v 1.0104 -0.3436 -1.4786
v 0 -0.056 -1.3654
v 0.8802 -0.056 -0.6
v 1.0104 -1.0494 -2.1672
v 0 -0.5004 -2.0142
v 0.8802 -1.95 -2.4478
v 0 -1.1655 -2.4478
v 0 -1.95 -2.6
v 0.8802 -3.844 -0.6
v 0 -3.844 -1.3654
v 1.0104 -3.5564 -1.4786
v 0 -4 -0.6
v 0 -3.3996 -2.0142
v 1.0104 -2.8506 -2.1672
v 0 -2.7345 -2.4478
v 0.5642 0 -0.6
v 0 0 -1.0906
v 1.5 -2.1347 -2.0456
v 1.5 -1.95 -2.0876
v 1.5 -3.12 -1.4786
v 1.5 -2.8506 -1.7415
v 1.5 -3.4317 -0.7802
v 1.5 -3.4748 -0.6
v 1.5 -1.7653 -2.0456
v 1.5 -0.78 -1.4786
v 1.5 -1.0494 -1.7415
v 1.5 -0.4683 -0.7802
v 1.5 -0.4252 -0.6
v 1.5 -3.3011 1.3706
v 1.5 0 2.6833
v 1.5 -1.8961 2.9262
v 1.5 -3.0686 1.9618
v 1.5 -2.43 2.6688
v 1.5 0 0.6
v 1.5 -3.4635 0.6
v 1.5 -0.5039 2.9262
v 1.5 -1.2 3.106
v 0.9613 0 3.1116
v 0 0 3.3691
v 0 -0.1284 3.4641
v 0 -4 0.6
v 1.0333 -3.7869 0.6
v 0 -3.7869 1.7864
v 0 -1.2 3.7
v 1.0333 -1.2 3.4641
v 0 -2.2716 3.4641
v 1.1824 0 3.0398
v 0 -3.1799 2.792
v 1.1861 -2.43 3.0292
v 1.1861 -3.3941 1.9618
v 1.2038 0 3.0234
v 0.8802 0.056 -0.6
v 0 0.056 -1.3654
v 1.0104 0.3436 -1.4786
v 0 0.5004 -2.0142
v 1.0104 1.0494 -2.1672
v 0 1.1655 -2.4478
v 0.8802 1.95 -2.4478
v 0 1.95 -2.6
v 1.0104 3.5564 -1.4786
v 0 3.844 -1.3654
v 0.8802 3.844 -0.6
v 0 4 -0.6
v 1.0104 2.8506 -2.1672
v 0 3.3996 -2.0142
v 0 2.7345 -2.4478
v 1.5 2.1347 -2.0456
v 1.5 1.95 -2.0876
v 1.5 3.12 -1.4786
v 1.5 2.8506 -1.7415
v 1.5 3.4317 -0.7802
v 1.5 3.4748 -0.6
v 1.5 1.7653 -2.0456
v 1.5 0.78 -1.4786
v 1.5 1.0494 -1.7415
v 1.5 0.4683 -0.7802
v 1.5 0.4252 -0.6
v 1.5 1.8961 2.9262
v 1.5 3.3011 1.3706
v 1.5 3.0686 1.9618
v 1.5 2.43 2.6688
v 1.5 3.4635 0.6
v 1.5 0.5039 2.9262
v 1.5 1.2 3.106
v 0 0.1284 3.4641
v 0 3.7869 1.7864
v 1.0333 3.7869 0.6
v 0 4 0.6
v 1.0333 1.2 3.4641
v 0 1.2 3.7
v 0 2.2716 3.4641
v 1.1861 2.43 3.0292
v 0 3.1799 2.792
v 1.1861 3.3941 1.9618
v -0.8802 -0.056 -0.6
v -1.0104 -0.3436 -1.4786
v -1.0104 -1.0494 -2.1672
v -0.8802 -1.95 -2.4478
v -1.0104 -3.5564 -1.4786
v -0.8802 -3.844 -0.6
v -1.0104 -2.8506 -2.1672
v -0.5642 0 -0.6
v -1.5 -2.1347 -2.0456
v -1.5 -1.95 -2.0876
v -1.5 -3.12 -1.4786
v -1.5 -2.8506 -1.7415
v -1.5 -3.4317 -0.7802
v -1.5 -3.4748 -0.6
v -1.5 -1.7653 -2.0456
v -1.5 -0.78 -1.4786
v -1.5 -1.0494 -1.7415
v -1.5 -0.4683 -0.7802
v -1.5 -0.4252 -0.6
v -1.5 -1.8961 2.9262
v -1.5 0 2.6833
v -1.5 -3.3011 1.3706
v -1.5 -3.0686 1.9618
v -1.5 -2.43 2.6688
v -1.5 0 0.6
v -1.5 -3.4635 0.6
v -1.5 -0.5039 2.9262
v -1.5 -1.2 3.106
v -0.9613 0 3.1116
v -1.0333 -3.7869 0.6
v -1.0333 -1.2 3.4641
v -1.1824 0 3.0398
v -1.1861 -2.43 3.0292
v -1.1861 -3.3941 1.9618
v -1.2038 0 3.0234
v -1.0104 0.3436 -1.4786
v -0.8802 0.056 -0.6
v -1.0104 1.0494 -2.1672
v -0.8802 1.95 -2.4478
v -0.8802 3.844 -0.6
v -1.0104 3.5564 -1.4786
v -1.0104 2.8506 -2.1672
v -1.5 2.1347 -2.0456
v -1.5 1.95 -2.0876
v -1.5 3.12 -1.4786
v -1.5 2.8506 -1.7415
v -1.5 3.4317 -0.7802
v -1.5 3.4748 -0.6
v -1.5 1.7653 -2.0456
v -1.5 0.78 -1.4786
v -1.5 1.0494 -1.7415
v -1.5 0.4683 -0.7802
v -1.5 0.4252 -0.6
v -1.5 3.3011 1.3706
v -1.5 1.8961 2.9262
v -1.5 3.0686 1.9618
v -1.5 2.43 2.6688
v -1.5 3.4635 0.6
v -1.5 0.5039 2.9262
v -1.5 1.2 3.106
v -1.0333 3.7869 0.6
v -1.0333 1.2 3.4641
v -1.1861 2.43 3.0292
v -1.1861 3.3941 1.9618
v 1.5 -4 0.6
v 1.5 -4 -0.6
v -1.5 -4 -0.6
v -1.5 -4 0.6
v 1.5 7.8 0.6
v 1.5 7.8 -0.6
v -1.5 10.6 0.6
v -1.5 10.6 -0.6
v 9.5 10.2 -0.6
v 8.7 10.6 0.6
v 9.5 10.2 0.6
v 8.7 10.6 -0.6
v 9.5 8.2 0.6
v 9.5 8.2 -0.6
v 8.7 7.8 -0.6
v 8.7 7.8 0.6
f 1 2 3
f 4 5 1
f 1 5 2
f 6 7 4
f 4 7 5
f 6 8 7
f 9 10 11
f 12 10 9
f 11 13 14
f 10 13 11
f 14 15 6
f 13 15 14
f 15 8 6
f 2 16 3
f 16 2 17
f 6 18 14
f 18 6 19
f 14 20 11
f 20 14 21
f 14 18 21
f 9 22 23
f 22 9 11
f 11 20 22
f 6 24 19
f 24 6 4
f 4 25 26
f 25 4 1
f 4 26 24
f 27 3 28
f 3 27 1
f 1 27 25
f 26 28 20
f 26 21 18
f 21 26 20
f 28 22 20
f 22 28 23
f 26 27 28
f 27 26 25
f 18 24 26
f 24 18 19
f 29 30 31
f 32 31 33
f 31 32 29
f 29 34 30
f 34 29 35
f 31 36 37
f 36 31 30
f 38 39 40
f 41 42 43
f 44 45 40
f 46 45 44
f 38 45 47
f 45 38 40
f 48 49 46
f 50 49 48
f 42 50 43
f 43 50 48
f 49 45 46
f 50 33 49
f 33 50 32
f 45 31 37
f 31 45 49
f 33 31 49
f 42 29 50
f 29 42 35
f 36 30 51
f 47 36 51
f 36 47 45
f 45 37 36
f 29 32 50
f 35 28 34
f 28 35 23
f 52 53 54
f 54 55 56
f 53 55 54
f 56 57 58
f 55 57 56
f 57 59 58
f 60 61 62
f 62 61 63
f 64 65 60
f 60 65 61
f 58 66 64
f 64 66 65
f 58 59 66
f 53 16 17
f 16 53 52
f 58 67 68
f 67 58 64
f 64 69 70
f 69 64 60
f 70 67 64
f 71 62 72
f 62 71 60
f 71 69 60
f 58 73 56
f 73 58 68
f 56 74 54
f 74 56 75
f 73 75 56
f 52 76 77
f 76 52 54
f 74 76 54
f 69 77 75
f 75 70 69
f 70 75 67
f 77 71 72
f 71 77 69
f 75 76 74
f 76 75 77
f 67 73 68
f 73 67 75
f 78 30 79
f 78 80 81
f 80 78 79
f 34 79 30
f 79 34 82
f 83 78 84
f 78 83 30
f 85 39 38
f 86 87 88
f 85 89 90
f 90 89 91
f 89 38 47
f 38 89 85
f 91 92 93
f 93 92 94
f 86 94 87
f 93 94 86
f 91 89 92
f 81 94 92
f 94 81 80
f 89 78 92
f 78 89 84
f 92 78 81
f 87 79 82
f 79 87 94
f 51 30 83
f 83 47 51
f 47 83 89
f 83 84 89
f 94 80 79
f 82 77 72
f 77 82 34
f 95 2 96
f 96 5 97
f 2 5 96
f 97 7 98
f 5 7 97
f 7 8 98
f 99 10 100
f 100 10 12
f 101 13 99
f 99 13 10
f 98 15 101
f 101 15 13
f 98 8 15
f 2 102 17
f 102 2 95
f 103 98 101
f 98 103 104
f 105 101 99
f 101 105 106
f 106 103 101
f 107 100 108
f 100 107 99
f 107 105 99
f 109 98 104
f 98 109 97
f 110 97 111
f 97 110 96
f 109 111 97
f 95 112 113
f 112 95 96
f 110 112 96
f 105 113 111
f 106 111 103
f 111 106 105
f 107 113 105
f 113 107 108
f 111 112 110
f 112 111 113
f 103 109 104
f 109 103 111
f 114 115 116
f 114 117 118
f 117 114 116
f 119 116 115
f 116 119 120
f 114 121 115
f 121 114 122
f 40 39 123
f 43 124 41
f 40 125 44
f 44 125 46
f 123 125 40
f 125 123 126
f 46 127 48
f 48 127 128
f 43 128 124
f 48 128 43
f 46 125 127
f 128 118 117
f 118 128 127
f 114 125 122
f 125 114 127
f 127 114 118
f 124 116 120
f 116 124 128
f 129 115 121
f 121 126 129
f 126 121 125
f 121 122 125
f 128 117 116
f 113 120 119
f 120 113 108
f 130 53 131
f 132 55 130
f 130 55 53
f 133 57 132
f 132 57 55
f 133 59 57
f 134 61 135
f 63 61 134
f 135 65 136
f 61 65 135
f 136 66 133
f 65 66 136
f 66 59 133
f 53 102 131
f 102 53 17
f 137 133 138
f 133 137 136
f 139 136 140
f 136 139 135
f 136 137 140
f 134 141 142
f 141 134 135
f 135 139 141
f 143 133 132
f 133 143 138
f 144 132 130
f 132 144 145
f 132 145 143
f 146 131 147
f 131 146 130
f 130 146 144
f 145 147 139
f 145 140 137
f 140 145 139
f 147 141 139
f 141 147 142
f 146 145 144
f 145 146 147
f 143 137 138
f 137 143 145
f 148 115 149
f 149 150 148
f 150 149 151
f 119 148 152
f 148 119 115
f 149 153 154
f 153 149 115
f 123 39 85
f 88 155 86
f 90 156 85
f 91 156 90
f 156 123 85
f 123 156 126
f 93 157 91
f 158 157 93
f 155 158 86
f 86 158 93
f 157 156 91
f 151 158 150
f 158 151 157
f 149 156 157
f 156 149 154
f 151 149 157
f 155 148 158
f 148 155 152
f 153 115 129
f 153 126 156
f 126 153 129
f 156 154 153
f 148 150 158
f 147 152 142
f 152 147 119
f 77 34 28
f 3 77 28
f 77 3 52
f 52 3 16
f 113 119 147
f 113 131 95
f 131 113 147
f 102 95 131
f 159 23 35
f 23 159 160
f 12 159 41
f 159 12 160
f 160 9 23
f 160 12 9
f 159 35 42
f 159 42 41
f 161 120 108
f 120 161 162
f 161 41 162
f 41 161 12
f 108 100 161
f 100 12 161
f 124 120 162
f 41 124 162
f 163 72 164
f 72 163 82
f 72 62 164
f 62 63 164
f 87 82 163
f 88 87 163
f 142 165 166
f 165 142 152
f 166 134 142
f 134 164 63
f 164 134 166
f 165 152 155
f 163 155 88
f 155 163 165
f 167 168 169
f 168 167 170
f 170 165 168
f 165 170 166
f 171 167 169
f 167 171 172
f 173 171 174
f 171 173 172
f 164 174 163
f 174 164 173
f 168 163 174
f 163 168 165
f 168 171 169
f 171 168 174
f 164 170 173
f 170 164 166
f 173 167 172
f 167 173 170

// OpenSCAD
use <../lib.scad>
use <../p/box2-5.scad>
use <../p/rect2p.scad>
use <../p/rect3.scad>
use <s/32024s01.scad>
$fa=1; $fs=0.2;
function ldraw_lib__32024(realsolid=false) = [
// 0 ~Electric Code Pilot Focusing Lens
// 0 Name: 32024.dat
// 0 Author: Max Martin Richter [MMR1988]
// 0 !LDRAW_ORG Part UPDATE 2015-02
// 0 !LICENSE Licensed under CC BY 2.0 and CC BY 4.0 : see CAreadme.txt
// 
// 0 BFC CERTIFY CCW
  [0,"BFC","CERTIFY"],
  [0,"BFC","CCW"],
// 
// 0 !HISTORY 2015-12-30 [PTadmin] Official Update 2015-02
// 
// 
// 1 16 0 0 0 1 0 0 0 1 0 0 0 1 s\32024s01.dat
  [1,16,0,0,0,1,0,0,0,1,0,0,0,1, ldraw_lib__s__32024s01(realsolid)],
// 1 16 0 0 0 1 0 0 0 1 0 0 0 -1 s\32024s01.dat
  [1,16,0,0,0,1,0,0,0,1,0,0,0,-1, ldraw_lib__s__32024s01(realsolid)],
// 1 16 0 0 0 -1 0 0 0 1 0 0 0 1 s\32024s01.dat
  [1,16,0,0,0,-1,0,0,0,1,0,0,0,1, ldraw_lib__s__32024s01(realsolid)],
// 1 16 0 0 0 -1 0 0 0 1 0 0 0 -1 s\32024s01.dat
  [1,16,0,0,0,-1,0,0,0,1,0,0,0,-1, ldraw_lib__s__32024s01(realsolid)],
// 
// 5 24 0 5.0355 -1.25111 0 3.4135 -0.140013 2.52597 3.6965 -0.85905 -2.52597 3.6965 -0.85905
  [5,24,0,5.0355,-1.25111,0,3.4135,-0.140013,2.52597,3.6965,-0.85905,-2.52597,3.6965,-0.85905],
// 5 24 0 3.4135 -0.140013 0 2.72656 0 1.41055 1.5 0 -2.20052 1.5 -0.140013
  [5,24,0,3.4135,-0.140013,0,2.72656,0,1.41055,1.5,0,-2.20052,1.5,-0.140013],
// 5 24 0 1.5 -10 0 3.4135 -9.60999 2.20052 1.5 -9.60999 -2.20052 1.5 -9.60999
  [5,24,0,1.5,-10,0,3.4135,-9.60999,2.20052,1.5,-9.60999,-2.20052,1.5,-9.60999],
// 5 24 0 3.4135 -9.60999 0 5.0355 -8.49889 2.52597 3.6965 -8.89095 -2.52597 3.6965 -8.89095
  [5,24,0,3.4135,-9.60999,0,5.0355,-8.49889,2.52597,3.6965,-8.89095,-2.52597,3.6965,-8.89095],
// 5 24 0 6.1195 -2.91366 0 5.0355 -1.25111 2.52597 5.418 -2.62359 -2.52597 5.418 -2.62359
  [5,24,0,6.1195,-2.91366,0,5.0355,-1.25111,2.52597,5.418,-2.62359,-2.52597,5.418,-2.62359],
// 5 24 0 6.5 -4.875 0 6.1195 -2.91366 2.20052 6.1195 -4.875 -2.20052 6.1195 -4.875
  [5,24,0,6.5,-4.875,0,6.1195,-2.91366,2.20052,6.1195,-4.875,-2.20052,6.1195,-4.875],
// 5 24 0 5.0355 -8.49889 0 6.1195 -6.83634 2.52597 5.418 -7.12641 -2.52597 5.418 -7.12641
  [5,24,0,5.0355,-8.49889,0,6.1195,-6.83634,2.52597,5.418,-7.12641,-2.52597,5.418,-7.12641],
// 5 24 0 6.1195 -6.83634 0 6.5 -4.875 2.20052 6.1195 -4.875 -2.20052 6.1195 -4.875
  [5,24,0,6.1195,-6.83634,0,6.5,-4.875,2.20052,6.1195,-4.875,-2.20052,6.1195,-4.875],
// 
// 5 24 0 -9.25 -3 0 -8.66023 -5.6789 -2.58323 -8.66023 -3 2.58323 -8.66023 -3
  [5,24,0,-9.25,-3,0,-8.66023,-5.6789,-2.58323,-8.66023,-3,2.58323,-8.66023,-3],
// 5 24 0 -8.66023 -5.6789 0 -6.98003 -7.9497 -2.96528 -7.5729 -6.0751 2.96528 -7.5729 -6.0751
  [5,24,0,-8.66023,-5.6789,0,-6.98003,-7.9497,-2.96528,-7.5729,-6.0751,2.96528,-7.5729,-6.0751],
// 5 24 0 -6.98003 -7.9497 0 -4.46593 -9.4673 -2.96528 -4.90458 -8.4852 2.96528 -4.90458 -8.4852
  [5,24,0,-6.98003,-7.9497,0,-4.46593,-9.4673,-2.96528,-4.90458,-8.4852,2.96528,-4.90458,-8.4852],
// 5 24 0 -8.42264 0 0 -8.66023 -0.3211 -2.4032 -7.779 0 2.4032 -7.779 0
  [5,24,0,-8.42264,0,0,-8.66023,-0.3211,-2.4032,-7.779,0,2.4032,-7.779,0],
// 5 24 0 -4.46593 -9.4673 0 -1.5 -10 -2.58323 -1.5 -9.4673 2.58323 -1.5 -9.4673
  [5,24,0,-4.46593,-9.4673,0,-1.5,-10,-2.58323,-1.5,-9.4673,2.58323,-1.5,-9.4673],
// 5 24 0 -8.66023 -0.3211 0 -9.25 -3 -2.58323 -8.66023 -3 2.58323 -8.66023 -3
  [5,24,0,-8.66023,-0.3211,0,-9.25,-3,-2.58323,-8.66023,-3,2.58323,-8.66023,-3],
// 
// 5 24 0 5.0355 1.25111 0 3.4135 0.140013 2.52597 3.6965 0.85905 -2.52597 3.6965 0.85905
  [5,24,0,5.0355,1.25111,0,3.4135,0.140013,2.52597,3.6965,0.85905,-2.52597,3.6965,0.85905],
// 5 24 0 3.4135 0.140013 0 2.72656 0 1.41055 1.5 0 -2.20052 1.5 0.140013
  [5,24,0,3.4135,0.140013,0,2.72656,0,1.41055,1.5,0,-2.20052,1.5,0.140013],
// 5 24 0 1.5 10 0 3.4135 9.60999 2.20052 1.5 9.60999 -2.20052 1.5 9.60999
  [5,24,0,1.5,10,0,3.4135,9.60999,2.20052,1.5,9.60999,-2.20052,1.5,9.60999],
// 5 24 0 3.4135 9.60999 0 5.0355 8.49889 2.52597 3.6965 8.89095 -2.52597 3.6965 8.89095
  [5,24,0,3.4135,9.60999,0,5.0355,8.49889,2.52597,3.6965,8.89095,-2.52597,3.6965,8.89095],
// 5 24 0 6.1195 2.91366 0 5.0355 1.25111 2.52597 5.418 2.62359 -2.52597 5.418 2.62359
  [5,24,0,6.1195,2.91366,0,5.0355,1.25111,2.52597,5.418,2.62359,-2.52597,5.418,2.62359],
// 5 24 0 6.5 4.875 0 6.1195 2.91366 2.20052 6.1195 4.875 -2.20052 6.1195 4.875
  [5,24,0,6.5,4.875,0,6.1195,2.91366,2.20052,6.1195,4.875,-2.20052,6.1195,4.875],
// 5 24 0 5.0355 8.49889 0 6.1195 6.83634 2.52597 5.418 7.12641 -2.52597 5.418 7.12641
  [5,24,0,5.0355,8.49889,0,6.1195,6.83634,2.52597,5.418,7.12641,-2.52597,5.418,7.12641],
// 5 24 0 6.1195 6.83634 0 6.5 4.875 2.20052 6.1195 4.875 -2.20052 6.1195 4.875
  [5,24,0,6.1195,6.83634,0,6.5,4.875,2.20052,6.1195,4.875,-2.20052,6.1195,4.875],
// 
// 5 24 0 -9.25 3 0 -8.66023 5.6789 -2.58323 -8.66023 3 2.58323 -8.66023 3
  [5,24,0,-9.25,3,0,-8.66023,5.6789,-2.58323,-8.66023,3,2.58323,-8.66023,3],
// 5 24 0 -8.66023 5.6789 0 -6.98003 7.9497 -2.96528 -7.5729 6.0751 2.96528 -7.5729 6.0751
  [5,24,0,-8.66023,5.6789,0,-6.98003,7.9497,-2.96528,-7.5729,6.0751,2.96528,-7.5729,6.0751],
// 5 24 0 -6.98003 7.9497 0 -4.46593 9.4673 -2.96528 -4.90458 8.4852 2.96528 -4.90458 8.4852
  [5,24,0,-6.98003,7.9497,0,-4.46593,9.4673,-2.96528,-4.90458,8.4852,2.96528,-4.90458,8.4852],
// 5 24 0 -8.42264 0 0 -8.66023 0.3211 -2.4032 -7.779 0 2.4032 -7.779 0
  [5,24,0,-8.42264,0,0,-8.66023,0.3211,-2.4032,-7.779,0,2.4032,-7.779,0],
// 5 24 0 -4.46593 9.4673 0 -1.5 10 -2.58323 -1.5 9.4673 2.58323 -1.5 9.4673
  [5,24,0,-4.46593,9.4673,0,-1.5,10,-2.58323,-1.5,9.4673,2.58323,-1.5,9.4673],
// 5 24 0 -8.66023 0.3211 0 -9.25 3 -2.58323 -8.66023 3 2.58323 -8.66023 3
  [5,24,0,-8.66023,0.3211,0,-9.25,3,-2.58323,-8.66023,3,2.58323,-8.66023,3],
// 
// 3 16 3.75 1.5 1.062986 3.75 -1.5 0 3.75 1.5 -1.062986
  [3,16,3.75,1.5,1.062986,3.75,-1.5,0,3.75,1.5,-1.062986],
// 4 16 3.75 1.5 1.062986 3.75 1.5 -1.062986 2.20052 1.5 -0.140013 2.20052 1.5 0.140013
  [4,16,3.75,1.5,1.062986,3.75,1.5,-1.062986,2.20052,1.5,-0.140013,2.20052,1.5,0.140013],
// 3 16 2.20052 1.5 0.140013 2.20052 1.5 -0.140013 1.41055 1.5 0
  [3,16,2.20052,1.5,0.140013,2.20052,1.5,-0.140013,1.41055,1.5,0],
// 2 24 3.75 1.5 1.062986 3.75 1.5 -1.062986
  [2,24,3.75,1.5,1.062986,3.75,1.5,-1.062986],
// 3 16 -3.75 1.5 -1.062986 -3.75 -1.5 0 -3.75 1.5 1.062986
  [3,16,-3.75,1.5,-1.062986,-3.75,-1.5,0,-3.75,1.5,1.062986],
// 4 16 -2.20052 1.5 0.140013 -2.20052 1.5 -0.140013 -3.75 1.5 -1.062986 -3.75 1.5 1.062986
  [4,16,-2.20052,1.5,0.140013,-2.20052,1.5,-0.140013,-3.75,1.5,-1.062986,-3.75,1.5,1.062986],
// 3 16 -1.41055 1.5 0 -2.20052 1.5 -0.140013 -2.20052 1.5 0.140013
  [3,16,-1.41055,1.5,0,-2.20052,1.5,-0.140013,-2.20052,1.5,0.140013],
// 2 24 -3.75 1.5 1.062986 -3.75 1.5 -1.062986
  [2,24,-3.75,1.5,1.062986,-3.75,1.5,-1.062986],
// 
// 4 16 3.75 -1.5 -10 3.75 1.5 -10 3.75 1.5 -8.68702 3.75 -1.5 -8.65865
  [4,16,3.75,-1.5,-10,3.75,1.5,-10,3.75,1.5,-8.68702,3.75,-1.5,-8.65865],
// 1 16 1.875 0 -10 0 0 1.875 1.5 0 0 0 1 0 rect3.dat
  [1,16,1.875,0,-10,0,0,1.875,1.5,0,0,0,1,0, ldraw_lib__rect3(realsolid)],
// 3 16 3.75 1.5 -10 2.20052 1.5 -9.60999 3.75 1.5 -8.68702
  [3,16,3.75,1.5,-10,2.20052,1.5,-9.60999,3.75,1.5,-8.68702],
// 3 16 3.75 1.5 -10 0 1.5 -10 2.20052 1.5 -9.60999
  [3,16,3.75,1.5,-10,0,1.5,-10,2.20052,1.5,-9.60999],
// 3 16 3.75 -1.5 -10 3.75 -1.5 -8.65865 2.58323 -1.5 -9.4673
  [3,16,3.75,-1.5,-10,3.75,-1.5,-8.65865,2.58323,-1.5,-9.4673],
// 3 16 3.75 -1.5 -10 2.58323 -1.5 -9.4673 0 -1.5 -10
  [3,16,3.75,-1.5,-10,2.58323,-1.5,-9.4673,0,-1.5,-10],
// 2 24 3.75 1.5 -10 3.75 1.5 -8.68702
  [2,24,3.75,1.5,-10,3.75,1.5,-8.68702],
// 2 24 3.75 -1.5 -10 3.75 -1.5 -8.65865
  [2,24,3.75,-1.5,-10,3.75,-1.5,-8.65865],
// 4 16 -3.75 -1.5 -8.65865 -3.75 1.5 -8.68702 -3.75 1.5 -10 -3.75 -1.5 -10
  [4,16,-3.75,-1.5,-8.65865,-3.75,1.5,-8.68702,-3.75,1.5,-10,-3.75,-1.5,-10],
// 1 16 -1.875 0 -10 0 0 -1.875 1.5 0 0 0 1 0 rect3.dat
  [1,16,-1.875,0,-10,0,0,-1.875,1.5,0,0,0,1,0, ldraw_lib__rect3(realsolid)],
// 3 16 -3.75 1.5 -8.68702 -2.20052 1.5 -9.60999 -3.75 1.5 -10
  [3,16,-3.75,1.5,-8.68702,-2.20052,1.5,-9.60999,-3.75,1.5,-10],
// 3 16 -2.20052 1.5 -9.60999 0 1.5 -10 -3.75 1.5 -10
  [3,16,-2.20052,1.5,-9.60999,0,1.5,-10,-3.75,1.5,-10],
// 3 16 -2.58323 -1.5 -9.4673 -3.75 -1.5 -8.65865 -3.75 -1.5 -10
  [3,16,-2.58323,-1.5,-9.4673,-3.75,-1.5,-8.65865,-3.75,-1.5,-10],
// 3 16 0 -1.5 -10 -2.58323 -1.5 -9.4673 -3.75 -1.5 -10
  [3,16,0,-1.5,-10,-2.58323,-1.5,-9.4673,-3.75,-1.5,-10],
// 2 24 -3.75 1.5 -10 -3.75 1.5 -8.68702
  [2,24,-3.75,1.5,-10,-3.75,1.5,-8.68702],
// 2 24 -3.75 -1.5 -10 -3.75 -1.5 -8.65865
  [2,24,-3.75,-1.5,-10,-3.75,-1.5,-8.65865],
// 
// 4 16 3.75 -1.5 8.65865 3.75 1.5 8.68702 3.75 1.5 19.5 3.75 -1.5 19.5
  [4,16,3.75,-1.5,8.65865,3.75,1.5,8.68702,3.75,1.5,19.5,3.75,-1.5,19.5],
// 3 16 3.75 1.5 8.68702 2.20052 1.5 9.60999 3.75 1.5 19.5
  [3,16,3.75,1.5,8.68702,2.20052,1.5,9.60999,3.75,1.5,19.5],
// 3 16 2.20052 1.5 9.60999 0 1.5 10 3.75 1.5 19.5
  [3,16,2.20052,1.5,9.60999,0,1.5,10,3.75,1.5,19.5],
// 3 16 2.58323 -1.5 9.4673 3.75 -1.5 8.65865 3.75 -1.5 19.5
  [3,16,2.58323,-1.5,9.4673,3.75,-1.5,8.65865,3.75,-1.5,19.5],
// 3 16 0 -1.5 10 2.58323 -1.5 9.4673 3.75 -1.5 19.5
  [3,16,0,-1.5,10,2.58323,-1.5,9.4673,3.75,-1.5,19.5],
// 2 24 3.75 1.5 8.68702 3.75 1.5 19.5
  [2,24,3.75,1.5,8.68702,3.75,1.5,19.5],
// 2 24 3.75 -1.5 8.65865 3.75 -1.5 19.5
  [2,24,3.75,-1.5,8.65865,3.75,-1.5,19.5],
// 
// 4 16 -3.75 -1.5 26.5 -3.75 1.5 26.5 -3.75 1.5 8.68702 -3.75 -1.5 8.65865
  [4,16,-3.75,-1.5,26.5,-3.75,1.5,26.5,-3.75,1.5,8.68702,-3.75,-1.5,8.65865],
// 3 16 -3.75 1.5 26.5 -2.20052 1.5 9.60999 -3.75 1.5 8.68702
  [3,16,-3.75,1.5,26.5,-2.20052,1.5,9.60999,-3.75,1.5,8.68702],
// 4 16 -3.75 1.5 26.5 3.75 1.5 19.5 0 1.5 10 -2.20052 1.5 9.60999
  [4,16,-3.75,1.5,26.5,3.75,1.5,19.5,0,1.5,10,-2.20052,1.5,9.60999],
// 3 16 -3.75 -1.5 26.5 -3.75 -1.5 8.65865 -2.58323 -1.5 9.4673
  [3,16,-3.75,-1.5,26.5,-3.75,-1.5,8.65865,-2.58323,-1.5,9.4673],
// 4 16 -3.75 -1.5 26.5 -2.58323 -1.5 9.4673 0 -1.5 10 3.75 -1.5 19.5
  [4,16,-3.75,-1.5,26.5,-2.58323,-1.5,9.4673,0,-1.5,10,3.75,-1.5,19.5],
// 2 24 -3.75 1.5 26.5 -3.75 1.5 8.68702
  [2,24,-3.75,1.5,26.5,-3.75,1.5,8.68702],
// 2 24 -3.75 -1.5 26.5 -3.75 -1.5 8.65865
  [2,24,-3.75,-1.5,26.5,-3.75,-1.5,8.65865],
// 
// 1 16 10 0 26 0 12.75 -1 1.5 0 0 0 0 0.5 box2-5.dat
  [1,16,10,0,26,0,12.75,-1,1.5,0,0,0,0,0.5, ldraw_lib__box2_5(realsolid)],
// 1 16 23.75 0 23 0 -1 0 0 0 1.5 2.5 0 0 rect2p.dat
  [1,16,23.75,0,23,0,-1,0,0,0,1.5,2.5,0,0, ldraw_lib__rect2p(realsolid)],
// 1 16 13.75 0 20 0 9 -1 1.5 0 0 0 0 -0.5 box2-5.dat
  [1,16,13.75,0,20,0,9,-1,1.5,0,0,0,0,-0.5, ldraw_lib__box2_5(realsolid)],
// 
// 4 16 3.75 -1.5 19.5 21.75 -1.5 19.5 21.75 -1.5 26.5 -3.75 -1.5 26.5
  [4,16,3.75,-1.5,19.5,21.75,-1.5,19.5,21.75,-1.5,26.5,-3.75,-1.5,26.5],
// 4 16 23.75 -1.5 20.5 23.75 -1.5 25.5 21.75 -1.5 26.5 21.75 -1.5 19.5
  [4,16,23.75,-1.5,20.5,23.75,-1.5,25.5,21.75,-1.5,26.5,21.75,-1.5,19.5],
// 4 16 -3.75 1.5 26.5 21.75 1.5 26.5 21.75 1.5 19.5 3.75 1.5 19.5
  [4,16,-3.75,1.5,26.5,21.75,1.5,26.5,21.75,1.5,19.5,3.75,1.5,19.5],
// 4 16 21.75 1.5 19.5 21.75 1.5 26.5 23.75 1.5 25.5 23.75 1.5 20.5
  [4,16,21.75,1.5,19.5,21.75,1.5,26.5,23.75,1.5,25.5,23.75,1.5,20.5],
// 
// 2 24 2.4032 -7.779 0 2.95594 -7.59945 0
  [2,24,2.4032,-7.779,0,2.95594,-7.59945,0],
// 2 24 0 -8.42264 0 2.4032 -7.779 0
  [2,24,0,-8.42264,0,2.4032,-7.779,0],
// 2 24 2.95594 -7.59945 0 3.00942 -7.55842 0
  [2,24,2.95594,-7.59945,0,3.00942,-7.55842,0],
// 2 24 3.00942 -7.55842 0 3.75 -6.70813 0
  [2,24,3.00942,-7.55842,0,3.75,-6.70813,0],
// 
// 2 24 -2.4032 -7.779 0 -2.95594 -7.59945 0
  [2,24,-2.4032,-7.779,0,-2.95594,-7.59945,0],
// 2 24 0 -8.42264 0 -2.4032 -7.779 0
  [2,24,0,-8.42264,0,-2.4032,-7.779,0],
// 2 24 -2.95594 -7.59945 0 -3.00942 -7.55842 0
  [2,24,-2.95594,-7.59945,0,-3.00942,-7.55842,0],
// 2 24 -3.00942 -7.55842 0 -3.75 -6.70813 0
  [2,24,-3.00942,-7.55842,0,-3.75,-6.70813,0],
// 
// 2 24 0 2.72656 0 1.41055 1.5 0
  [2,24,0,2.72656,0,1.41055,1.5,0],
// 2 24 0 2.72656 0 -1.41055 1.5 0
  [2,24,0,2.72656,0,-1.41055,1.5,0],
];
module ldraw_lib__32024(step=0, col=false, unit=2/5, alt=false, line=0.2, solid=!$preview)
    makepoly(ldraw_lib__32024(solid), step=step, col=col, unit=unit, alt=alt, line=line, solid=solid);
ldraw_lib__32024(line=0.2);
